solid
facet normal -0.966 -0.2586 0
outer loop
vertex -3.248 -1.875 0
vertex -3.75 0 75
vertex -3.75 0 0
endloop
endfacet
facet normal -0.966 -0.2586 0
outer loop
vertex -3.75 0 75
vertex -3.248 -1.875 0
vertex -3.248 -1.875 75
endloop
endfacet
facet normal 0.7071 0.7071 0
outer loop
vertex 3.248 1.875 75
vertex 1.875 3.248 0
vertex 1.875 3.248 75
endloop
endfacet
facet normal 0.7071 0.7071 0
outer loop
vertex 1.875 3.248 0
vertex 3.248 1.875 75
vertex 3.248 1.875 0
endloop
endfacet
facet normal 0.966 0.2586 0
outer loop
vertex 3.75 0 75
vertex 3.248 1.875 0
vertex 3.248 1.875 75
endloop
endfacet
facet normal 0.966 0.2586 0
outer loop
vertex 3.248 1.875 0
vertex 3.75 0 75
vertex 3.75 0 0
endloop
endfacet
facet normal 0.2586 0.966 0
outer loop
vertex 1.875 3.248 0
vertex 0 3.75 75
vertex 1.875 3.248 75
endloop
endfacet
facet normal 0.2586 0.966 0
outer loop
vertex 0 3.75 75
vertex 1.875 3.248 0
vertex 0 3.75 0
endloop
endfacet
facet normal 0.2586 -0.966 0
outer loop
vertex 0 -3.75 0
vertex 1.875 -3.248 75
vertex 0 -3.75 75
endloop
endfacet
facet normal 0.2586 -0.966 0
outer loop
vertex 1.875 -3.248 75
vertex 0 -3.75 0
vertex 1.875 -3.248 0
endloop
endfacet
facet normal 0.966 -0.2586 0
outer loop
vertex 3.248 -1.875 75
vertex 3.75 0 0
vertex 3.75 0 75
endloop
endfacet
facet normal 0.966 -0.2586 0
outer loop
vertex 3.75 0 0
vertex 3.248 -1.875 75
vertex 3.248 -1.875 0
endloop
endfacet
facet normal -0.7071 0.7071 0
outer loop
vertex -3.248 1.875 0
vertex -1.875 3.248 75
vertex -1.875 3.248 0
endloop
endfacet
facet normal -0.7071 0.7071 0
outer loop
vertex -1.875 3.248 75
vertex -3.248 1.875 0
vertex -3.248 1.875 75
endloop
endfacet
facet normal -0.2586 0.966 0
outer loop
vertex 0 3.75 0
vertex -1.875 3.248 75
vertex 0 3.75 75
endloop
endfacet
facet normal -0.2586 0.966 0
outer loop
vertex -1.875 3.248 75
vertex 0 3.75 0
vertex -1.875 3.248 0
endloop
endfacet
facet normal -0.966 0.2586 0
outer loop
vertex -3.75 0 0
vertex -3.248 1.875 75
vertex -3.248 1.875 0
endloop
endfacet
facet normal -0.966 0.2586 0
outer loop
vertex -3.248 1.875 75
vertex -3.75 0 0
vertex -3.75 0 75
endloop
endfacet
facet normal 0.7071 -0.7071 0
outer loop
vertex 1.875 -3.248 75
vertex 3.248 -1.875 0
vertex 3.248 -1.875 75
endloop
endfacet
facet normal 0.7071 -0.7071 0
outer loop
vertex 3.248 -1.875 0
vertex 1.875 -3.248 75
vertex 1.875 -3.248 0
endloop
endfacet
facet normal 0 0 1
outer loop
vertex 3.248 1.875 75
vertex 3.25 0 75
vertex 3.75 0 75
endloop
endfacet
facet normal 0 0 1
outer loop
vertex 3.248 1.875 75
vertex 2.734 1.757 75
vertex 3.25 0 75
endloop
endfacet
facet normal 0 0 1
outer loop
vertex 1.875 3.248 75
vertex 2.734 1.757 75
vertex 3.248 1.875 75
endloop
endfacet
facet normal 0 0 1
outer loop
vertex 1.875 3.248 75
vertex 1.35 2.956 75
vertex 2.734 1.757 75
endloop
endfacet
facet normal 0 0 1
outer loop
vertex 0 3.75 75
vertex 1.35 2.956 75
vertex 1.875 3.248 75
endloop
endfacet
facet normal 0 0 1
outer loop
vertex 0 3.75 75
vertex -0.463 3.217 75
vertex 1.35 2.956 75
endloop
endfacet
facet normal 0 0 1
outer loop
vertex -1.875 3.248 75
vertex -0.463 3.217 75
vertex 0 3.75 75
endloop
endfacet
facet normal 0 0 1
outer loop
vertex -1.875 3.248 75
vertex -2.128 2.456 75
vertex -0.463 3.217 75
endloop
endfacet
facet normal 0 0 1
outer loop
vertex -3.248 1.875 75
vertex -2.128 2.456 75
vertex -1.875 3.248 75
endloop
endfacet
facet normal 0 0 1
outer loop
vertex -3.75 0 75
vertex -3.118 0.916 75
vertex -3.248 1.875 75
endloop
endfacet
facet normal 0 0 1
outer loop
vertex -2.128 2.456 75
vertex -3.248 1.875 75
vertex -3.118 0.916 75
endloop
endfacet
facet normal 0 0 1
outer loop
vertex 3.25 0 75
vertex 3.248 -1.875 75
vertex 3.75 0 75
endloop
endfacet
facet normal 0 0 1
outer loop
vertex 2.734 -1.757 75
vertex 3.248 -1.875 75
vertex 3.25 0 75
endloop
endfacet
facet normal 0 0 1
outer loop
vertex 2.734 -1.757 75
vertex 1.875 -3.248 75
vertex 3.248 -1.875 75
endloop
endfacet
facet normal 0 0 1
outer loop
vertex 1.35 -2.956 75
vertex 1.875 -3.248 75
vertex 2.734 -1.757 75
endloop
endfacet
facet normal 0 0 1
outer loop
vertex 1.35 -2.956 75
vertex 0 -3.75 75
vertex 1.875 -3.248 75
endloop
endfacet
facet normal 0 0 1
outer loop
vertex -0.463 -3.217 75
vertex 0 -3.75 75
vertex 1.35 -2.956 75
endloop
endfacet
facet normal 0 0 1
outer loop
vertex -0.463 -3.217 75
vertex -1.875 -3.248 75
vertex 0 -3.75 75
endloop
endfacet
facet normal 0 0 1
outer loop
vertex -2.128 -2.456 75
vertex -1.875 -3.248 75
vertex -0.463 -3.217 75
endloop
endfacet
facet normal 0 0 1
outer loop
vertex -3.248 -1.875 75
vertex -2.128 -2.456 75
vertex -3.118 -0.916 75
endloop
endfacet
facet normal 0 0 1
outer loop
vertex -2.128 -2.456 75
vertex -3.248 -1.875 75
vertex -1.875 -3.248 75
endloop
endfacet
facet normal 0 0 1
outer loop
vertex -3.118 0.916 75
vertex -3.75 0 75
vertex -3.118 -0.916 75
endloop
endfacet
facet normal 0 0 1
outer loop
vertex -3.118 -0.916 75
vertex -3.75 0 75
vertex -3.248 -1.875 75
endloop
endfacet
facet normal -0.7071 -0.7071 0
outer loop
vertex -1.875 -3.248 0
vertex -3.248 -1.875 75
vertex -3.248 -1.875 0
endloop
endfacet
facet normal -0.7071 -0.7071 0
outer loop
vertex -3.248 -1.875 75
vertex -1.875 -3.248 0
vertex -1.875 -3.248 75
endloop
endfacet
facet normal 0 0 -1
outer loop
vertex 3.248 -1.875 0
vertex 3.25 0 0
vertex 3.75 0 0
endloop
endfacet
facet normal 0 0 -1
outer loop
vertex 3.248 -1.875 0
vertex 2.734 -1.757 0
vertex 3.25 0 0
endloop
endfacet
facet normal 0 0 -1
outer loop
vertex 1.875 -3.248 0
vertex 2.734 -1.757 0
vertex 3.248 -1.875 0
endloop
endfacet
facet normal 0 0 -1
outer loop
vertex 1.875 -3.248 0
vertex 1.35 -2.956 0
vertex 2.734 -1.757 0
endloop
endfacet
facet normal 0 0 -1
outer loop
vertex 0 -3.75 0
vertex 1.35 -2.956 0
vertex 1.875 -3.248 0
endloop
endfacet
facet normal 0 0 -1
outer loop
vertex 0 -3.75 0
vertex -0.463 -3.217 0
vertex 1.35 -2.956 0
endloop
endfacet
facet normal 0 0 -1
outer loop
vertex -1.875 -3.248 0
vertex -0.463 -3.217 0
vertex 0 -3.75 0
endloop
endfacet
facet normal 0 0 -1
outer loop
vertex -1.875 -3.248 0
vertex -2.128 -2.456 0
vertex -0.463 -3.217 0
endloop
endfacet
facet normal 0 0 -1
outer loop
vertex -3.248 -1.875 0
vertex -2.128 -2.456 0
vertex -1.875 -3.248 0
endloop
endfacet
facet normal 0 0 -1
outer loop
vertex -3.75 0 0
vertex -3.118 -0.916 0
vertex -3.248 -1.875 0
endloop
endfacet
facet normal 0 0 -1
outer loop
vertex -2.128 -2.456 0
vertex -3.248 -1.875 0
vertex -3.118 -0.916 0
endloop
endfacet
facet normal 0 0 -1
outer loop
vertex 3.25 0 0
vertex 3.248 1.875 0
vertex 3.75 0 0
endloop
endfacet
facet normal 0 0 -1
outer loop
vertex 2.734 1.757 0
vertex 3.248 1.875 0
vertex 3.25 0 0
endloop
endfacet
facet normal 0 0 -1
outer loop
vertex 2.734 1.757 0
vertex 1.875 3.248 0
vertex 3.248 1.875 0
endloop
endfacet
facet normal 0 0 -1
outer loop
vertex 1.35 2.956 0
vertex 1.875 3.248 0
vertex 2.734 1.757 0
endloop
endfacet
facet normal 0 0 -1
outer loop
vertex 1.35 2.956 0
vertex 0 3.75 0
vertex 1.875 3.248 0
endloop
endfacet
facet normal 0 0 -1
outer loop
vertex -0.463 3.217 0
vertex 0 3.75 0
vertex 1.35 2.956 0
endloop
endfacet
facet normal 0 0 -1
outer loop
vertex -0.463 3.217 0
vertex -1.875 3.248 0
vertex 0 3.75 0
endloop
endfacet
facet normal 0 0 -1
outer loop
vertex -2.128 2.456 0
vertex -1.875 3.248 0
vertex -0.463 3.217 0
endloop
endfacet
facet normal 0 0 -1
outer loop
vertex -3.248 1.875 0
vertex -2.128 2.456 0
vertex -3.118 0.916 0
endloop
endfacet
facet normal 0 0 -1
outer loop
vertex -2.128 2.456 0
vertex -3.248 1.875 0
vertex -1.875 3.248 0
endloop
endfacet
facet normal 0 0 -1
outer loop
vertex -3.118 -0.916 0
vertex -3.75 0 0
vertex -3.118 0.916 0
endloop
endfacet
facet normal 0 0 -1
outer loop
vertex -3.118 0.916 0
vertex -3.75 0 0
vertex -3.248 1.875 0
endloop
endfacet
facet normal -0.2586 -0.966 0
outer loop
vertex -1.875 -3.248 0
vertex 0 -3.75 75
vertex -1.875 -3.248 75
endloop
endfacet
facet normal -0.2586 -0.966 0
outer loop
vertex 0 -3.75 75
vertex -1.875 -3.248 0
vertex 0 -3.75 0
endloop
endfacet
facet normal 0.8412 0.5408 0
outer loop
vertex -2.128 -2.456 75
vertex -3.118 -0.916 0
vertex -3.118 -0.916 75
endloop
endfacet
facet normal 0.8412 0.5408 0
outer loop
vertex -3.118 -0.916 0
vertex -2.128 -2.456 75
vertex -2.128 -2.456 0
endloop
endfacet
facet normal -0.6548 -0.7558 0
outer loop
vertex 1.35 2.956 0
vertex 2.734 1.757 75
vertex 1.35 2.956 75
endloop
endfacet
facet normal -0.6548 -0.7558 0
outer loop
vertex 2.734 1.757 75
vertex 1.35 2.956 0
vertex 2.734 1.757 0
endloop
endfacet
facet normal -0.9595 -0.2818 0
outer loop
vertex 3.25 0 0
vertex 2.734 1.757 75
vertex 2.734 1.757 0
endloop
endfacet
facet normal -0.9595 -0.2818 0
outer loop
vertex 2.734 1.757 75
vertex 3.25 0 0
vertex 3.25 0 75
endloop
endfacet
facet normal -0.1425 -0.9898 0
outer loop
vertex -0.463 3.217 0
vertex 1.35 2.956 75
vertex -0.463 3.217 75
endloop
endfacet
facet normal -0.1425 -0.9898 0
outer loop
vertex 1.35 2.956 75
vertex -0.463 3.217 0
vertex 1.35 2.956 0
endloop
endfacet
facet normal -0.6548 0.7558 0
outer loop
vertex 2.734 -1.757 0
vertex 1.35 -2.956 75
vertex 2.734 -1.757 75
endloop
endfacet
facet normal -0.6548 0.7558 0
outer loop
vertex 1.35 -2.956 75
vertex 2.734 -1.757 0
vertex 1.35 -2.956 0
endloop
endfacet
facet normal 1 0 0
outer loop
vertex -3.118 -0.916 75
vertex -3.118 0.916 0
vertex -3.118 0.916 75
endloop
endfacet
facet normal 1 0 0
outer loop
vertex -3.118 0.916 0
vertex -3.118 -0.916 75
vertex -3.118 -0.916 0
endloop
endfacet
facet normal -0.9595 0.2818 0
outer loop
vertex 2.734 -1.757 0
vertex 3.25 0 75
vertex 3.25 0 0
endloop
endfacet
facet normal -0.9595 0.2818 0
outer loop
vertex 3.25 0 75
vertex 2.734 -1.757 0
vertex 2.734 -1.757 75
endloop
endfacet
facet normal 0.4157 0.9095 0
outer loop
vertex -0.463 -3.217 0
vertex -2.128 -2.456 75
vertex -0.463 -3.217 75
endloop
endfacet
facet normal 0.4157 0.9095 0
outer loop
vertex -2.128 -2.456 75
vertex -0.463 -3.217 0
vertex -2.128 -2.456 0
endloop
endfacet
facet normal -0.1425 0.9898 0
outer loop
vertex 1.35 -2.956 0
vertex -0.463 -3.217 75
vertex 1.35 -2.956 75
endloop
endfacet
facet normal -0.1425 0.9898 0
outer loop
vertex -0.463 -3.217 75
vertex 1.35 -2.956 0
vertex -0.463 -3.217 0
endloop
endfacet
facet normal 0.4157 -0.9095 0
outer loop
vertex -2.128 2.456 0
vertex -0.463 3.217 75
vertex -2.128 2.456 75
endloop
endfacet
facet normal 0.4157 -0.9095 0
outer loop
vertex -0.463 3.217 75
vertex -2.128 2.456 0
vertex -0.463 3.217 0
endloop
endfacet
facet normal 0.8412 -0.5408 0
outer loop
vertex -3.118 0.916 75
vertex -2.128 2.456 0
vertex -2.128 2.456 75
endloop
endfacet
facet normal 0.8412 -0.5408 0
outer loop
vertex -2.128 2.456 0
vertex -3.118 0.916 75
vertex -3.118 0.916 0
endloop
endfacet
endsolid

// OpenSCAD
// file: ../../vars.scad
// style
carbonColor = "#3e4042";
plaColor = "#00ff00";


// arms
armLength = 500;
armBoxWidth = 12.5;
armBoxWallThickness = 0.5;
armFixingHoleDia = 4;

// landing gear
landingGearSpacing = 175;

landingGearLegLength = 75;
landingGearLegDia = 7.5;
landingGearLegWallThickness = 0.5;

landingGearFootThickness = 0.5;
landingGearFootDia = 30;
landingGearFootSocketHeight = 15;
landingGearFootSocketWallThickness = 0.5;

landingGearBracketWallThickness = 1;
landingGearBracketSocketWallThickness = 1;
landingGearBracketSocketHeight = 15;
// main file
include<../../vars.scad>

module landingGearLeg(){
    difference(){    
        color(carbonColor) cylinder(h = landingGearLegLength, d = landingGearLegDia);
        translate([0, 0, -0.5]) cylinder(h = landingGearLegLength + 1, d = landingGearLegDia - landingGearLegWallThickness * 2);
    };
};

landingGearLeg();
